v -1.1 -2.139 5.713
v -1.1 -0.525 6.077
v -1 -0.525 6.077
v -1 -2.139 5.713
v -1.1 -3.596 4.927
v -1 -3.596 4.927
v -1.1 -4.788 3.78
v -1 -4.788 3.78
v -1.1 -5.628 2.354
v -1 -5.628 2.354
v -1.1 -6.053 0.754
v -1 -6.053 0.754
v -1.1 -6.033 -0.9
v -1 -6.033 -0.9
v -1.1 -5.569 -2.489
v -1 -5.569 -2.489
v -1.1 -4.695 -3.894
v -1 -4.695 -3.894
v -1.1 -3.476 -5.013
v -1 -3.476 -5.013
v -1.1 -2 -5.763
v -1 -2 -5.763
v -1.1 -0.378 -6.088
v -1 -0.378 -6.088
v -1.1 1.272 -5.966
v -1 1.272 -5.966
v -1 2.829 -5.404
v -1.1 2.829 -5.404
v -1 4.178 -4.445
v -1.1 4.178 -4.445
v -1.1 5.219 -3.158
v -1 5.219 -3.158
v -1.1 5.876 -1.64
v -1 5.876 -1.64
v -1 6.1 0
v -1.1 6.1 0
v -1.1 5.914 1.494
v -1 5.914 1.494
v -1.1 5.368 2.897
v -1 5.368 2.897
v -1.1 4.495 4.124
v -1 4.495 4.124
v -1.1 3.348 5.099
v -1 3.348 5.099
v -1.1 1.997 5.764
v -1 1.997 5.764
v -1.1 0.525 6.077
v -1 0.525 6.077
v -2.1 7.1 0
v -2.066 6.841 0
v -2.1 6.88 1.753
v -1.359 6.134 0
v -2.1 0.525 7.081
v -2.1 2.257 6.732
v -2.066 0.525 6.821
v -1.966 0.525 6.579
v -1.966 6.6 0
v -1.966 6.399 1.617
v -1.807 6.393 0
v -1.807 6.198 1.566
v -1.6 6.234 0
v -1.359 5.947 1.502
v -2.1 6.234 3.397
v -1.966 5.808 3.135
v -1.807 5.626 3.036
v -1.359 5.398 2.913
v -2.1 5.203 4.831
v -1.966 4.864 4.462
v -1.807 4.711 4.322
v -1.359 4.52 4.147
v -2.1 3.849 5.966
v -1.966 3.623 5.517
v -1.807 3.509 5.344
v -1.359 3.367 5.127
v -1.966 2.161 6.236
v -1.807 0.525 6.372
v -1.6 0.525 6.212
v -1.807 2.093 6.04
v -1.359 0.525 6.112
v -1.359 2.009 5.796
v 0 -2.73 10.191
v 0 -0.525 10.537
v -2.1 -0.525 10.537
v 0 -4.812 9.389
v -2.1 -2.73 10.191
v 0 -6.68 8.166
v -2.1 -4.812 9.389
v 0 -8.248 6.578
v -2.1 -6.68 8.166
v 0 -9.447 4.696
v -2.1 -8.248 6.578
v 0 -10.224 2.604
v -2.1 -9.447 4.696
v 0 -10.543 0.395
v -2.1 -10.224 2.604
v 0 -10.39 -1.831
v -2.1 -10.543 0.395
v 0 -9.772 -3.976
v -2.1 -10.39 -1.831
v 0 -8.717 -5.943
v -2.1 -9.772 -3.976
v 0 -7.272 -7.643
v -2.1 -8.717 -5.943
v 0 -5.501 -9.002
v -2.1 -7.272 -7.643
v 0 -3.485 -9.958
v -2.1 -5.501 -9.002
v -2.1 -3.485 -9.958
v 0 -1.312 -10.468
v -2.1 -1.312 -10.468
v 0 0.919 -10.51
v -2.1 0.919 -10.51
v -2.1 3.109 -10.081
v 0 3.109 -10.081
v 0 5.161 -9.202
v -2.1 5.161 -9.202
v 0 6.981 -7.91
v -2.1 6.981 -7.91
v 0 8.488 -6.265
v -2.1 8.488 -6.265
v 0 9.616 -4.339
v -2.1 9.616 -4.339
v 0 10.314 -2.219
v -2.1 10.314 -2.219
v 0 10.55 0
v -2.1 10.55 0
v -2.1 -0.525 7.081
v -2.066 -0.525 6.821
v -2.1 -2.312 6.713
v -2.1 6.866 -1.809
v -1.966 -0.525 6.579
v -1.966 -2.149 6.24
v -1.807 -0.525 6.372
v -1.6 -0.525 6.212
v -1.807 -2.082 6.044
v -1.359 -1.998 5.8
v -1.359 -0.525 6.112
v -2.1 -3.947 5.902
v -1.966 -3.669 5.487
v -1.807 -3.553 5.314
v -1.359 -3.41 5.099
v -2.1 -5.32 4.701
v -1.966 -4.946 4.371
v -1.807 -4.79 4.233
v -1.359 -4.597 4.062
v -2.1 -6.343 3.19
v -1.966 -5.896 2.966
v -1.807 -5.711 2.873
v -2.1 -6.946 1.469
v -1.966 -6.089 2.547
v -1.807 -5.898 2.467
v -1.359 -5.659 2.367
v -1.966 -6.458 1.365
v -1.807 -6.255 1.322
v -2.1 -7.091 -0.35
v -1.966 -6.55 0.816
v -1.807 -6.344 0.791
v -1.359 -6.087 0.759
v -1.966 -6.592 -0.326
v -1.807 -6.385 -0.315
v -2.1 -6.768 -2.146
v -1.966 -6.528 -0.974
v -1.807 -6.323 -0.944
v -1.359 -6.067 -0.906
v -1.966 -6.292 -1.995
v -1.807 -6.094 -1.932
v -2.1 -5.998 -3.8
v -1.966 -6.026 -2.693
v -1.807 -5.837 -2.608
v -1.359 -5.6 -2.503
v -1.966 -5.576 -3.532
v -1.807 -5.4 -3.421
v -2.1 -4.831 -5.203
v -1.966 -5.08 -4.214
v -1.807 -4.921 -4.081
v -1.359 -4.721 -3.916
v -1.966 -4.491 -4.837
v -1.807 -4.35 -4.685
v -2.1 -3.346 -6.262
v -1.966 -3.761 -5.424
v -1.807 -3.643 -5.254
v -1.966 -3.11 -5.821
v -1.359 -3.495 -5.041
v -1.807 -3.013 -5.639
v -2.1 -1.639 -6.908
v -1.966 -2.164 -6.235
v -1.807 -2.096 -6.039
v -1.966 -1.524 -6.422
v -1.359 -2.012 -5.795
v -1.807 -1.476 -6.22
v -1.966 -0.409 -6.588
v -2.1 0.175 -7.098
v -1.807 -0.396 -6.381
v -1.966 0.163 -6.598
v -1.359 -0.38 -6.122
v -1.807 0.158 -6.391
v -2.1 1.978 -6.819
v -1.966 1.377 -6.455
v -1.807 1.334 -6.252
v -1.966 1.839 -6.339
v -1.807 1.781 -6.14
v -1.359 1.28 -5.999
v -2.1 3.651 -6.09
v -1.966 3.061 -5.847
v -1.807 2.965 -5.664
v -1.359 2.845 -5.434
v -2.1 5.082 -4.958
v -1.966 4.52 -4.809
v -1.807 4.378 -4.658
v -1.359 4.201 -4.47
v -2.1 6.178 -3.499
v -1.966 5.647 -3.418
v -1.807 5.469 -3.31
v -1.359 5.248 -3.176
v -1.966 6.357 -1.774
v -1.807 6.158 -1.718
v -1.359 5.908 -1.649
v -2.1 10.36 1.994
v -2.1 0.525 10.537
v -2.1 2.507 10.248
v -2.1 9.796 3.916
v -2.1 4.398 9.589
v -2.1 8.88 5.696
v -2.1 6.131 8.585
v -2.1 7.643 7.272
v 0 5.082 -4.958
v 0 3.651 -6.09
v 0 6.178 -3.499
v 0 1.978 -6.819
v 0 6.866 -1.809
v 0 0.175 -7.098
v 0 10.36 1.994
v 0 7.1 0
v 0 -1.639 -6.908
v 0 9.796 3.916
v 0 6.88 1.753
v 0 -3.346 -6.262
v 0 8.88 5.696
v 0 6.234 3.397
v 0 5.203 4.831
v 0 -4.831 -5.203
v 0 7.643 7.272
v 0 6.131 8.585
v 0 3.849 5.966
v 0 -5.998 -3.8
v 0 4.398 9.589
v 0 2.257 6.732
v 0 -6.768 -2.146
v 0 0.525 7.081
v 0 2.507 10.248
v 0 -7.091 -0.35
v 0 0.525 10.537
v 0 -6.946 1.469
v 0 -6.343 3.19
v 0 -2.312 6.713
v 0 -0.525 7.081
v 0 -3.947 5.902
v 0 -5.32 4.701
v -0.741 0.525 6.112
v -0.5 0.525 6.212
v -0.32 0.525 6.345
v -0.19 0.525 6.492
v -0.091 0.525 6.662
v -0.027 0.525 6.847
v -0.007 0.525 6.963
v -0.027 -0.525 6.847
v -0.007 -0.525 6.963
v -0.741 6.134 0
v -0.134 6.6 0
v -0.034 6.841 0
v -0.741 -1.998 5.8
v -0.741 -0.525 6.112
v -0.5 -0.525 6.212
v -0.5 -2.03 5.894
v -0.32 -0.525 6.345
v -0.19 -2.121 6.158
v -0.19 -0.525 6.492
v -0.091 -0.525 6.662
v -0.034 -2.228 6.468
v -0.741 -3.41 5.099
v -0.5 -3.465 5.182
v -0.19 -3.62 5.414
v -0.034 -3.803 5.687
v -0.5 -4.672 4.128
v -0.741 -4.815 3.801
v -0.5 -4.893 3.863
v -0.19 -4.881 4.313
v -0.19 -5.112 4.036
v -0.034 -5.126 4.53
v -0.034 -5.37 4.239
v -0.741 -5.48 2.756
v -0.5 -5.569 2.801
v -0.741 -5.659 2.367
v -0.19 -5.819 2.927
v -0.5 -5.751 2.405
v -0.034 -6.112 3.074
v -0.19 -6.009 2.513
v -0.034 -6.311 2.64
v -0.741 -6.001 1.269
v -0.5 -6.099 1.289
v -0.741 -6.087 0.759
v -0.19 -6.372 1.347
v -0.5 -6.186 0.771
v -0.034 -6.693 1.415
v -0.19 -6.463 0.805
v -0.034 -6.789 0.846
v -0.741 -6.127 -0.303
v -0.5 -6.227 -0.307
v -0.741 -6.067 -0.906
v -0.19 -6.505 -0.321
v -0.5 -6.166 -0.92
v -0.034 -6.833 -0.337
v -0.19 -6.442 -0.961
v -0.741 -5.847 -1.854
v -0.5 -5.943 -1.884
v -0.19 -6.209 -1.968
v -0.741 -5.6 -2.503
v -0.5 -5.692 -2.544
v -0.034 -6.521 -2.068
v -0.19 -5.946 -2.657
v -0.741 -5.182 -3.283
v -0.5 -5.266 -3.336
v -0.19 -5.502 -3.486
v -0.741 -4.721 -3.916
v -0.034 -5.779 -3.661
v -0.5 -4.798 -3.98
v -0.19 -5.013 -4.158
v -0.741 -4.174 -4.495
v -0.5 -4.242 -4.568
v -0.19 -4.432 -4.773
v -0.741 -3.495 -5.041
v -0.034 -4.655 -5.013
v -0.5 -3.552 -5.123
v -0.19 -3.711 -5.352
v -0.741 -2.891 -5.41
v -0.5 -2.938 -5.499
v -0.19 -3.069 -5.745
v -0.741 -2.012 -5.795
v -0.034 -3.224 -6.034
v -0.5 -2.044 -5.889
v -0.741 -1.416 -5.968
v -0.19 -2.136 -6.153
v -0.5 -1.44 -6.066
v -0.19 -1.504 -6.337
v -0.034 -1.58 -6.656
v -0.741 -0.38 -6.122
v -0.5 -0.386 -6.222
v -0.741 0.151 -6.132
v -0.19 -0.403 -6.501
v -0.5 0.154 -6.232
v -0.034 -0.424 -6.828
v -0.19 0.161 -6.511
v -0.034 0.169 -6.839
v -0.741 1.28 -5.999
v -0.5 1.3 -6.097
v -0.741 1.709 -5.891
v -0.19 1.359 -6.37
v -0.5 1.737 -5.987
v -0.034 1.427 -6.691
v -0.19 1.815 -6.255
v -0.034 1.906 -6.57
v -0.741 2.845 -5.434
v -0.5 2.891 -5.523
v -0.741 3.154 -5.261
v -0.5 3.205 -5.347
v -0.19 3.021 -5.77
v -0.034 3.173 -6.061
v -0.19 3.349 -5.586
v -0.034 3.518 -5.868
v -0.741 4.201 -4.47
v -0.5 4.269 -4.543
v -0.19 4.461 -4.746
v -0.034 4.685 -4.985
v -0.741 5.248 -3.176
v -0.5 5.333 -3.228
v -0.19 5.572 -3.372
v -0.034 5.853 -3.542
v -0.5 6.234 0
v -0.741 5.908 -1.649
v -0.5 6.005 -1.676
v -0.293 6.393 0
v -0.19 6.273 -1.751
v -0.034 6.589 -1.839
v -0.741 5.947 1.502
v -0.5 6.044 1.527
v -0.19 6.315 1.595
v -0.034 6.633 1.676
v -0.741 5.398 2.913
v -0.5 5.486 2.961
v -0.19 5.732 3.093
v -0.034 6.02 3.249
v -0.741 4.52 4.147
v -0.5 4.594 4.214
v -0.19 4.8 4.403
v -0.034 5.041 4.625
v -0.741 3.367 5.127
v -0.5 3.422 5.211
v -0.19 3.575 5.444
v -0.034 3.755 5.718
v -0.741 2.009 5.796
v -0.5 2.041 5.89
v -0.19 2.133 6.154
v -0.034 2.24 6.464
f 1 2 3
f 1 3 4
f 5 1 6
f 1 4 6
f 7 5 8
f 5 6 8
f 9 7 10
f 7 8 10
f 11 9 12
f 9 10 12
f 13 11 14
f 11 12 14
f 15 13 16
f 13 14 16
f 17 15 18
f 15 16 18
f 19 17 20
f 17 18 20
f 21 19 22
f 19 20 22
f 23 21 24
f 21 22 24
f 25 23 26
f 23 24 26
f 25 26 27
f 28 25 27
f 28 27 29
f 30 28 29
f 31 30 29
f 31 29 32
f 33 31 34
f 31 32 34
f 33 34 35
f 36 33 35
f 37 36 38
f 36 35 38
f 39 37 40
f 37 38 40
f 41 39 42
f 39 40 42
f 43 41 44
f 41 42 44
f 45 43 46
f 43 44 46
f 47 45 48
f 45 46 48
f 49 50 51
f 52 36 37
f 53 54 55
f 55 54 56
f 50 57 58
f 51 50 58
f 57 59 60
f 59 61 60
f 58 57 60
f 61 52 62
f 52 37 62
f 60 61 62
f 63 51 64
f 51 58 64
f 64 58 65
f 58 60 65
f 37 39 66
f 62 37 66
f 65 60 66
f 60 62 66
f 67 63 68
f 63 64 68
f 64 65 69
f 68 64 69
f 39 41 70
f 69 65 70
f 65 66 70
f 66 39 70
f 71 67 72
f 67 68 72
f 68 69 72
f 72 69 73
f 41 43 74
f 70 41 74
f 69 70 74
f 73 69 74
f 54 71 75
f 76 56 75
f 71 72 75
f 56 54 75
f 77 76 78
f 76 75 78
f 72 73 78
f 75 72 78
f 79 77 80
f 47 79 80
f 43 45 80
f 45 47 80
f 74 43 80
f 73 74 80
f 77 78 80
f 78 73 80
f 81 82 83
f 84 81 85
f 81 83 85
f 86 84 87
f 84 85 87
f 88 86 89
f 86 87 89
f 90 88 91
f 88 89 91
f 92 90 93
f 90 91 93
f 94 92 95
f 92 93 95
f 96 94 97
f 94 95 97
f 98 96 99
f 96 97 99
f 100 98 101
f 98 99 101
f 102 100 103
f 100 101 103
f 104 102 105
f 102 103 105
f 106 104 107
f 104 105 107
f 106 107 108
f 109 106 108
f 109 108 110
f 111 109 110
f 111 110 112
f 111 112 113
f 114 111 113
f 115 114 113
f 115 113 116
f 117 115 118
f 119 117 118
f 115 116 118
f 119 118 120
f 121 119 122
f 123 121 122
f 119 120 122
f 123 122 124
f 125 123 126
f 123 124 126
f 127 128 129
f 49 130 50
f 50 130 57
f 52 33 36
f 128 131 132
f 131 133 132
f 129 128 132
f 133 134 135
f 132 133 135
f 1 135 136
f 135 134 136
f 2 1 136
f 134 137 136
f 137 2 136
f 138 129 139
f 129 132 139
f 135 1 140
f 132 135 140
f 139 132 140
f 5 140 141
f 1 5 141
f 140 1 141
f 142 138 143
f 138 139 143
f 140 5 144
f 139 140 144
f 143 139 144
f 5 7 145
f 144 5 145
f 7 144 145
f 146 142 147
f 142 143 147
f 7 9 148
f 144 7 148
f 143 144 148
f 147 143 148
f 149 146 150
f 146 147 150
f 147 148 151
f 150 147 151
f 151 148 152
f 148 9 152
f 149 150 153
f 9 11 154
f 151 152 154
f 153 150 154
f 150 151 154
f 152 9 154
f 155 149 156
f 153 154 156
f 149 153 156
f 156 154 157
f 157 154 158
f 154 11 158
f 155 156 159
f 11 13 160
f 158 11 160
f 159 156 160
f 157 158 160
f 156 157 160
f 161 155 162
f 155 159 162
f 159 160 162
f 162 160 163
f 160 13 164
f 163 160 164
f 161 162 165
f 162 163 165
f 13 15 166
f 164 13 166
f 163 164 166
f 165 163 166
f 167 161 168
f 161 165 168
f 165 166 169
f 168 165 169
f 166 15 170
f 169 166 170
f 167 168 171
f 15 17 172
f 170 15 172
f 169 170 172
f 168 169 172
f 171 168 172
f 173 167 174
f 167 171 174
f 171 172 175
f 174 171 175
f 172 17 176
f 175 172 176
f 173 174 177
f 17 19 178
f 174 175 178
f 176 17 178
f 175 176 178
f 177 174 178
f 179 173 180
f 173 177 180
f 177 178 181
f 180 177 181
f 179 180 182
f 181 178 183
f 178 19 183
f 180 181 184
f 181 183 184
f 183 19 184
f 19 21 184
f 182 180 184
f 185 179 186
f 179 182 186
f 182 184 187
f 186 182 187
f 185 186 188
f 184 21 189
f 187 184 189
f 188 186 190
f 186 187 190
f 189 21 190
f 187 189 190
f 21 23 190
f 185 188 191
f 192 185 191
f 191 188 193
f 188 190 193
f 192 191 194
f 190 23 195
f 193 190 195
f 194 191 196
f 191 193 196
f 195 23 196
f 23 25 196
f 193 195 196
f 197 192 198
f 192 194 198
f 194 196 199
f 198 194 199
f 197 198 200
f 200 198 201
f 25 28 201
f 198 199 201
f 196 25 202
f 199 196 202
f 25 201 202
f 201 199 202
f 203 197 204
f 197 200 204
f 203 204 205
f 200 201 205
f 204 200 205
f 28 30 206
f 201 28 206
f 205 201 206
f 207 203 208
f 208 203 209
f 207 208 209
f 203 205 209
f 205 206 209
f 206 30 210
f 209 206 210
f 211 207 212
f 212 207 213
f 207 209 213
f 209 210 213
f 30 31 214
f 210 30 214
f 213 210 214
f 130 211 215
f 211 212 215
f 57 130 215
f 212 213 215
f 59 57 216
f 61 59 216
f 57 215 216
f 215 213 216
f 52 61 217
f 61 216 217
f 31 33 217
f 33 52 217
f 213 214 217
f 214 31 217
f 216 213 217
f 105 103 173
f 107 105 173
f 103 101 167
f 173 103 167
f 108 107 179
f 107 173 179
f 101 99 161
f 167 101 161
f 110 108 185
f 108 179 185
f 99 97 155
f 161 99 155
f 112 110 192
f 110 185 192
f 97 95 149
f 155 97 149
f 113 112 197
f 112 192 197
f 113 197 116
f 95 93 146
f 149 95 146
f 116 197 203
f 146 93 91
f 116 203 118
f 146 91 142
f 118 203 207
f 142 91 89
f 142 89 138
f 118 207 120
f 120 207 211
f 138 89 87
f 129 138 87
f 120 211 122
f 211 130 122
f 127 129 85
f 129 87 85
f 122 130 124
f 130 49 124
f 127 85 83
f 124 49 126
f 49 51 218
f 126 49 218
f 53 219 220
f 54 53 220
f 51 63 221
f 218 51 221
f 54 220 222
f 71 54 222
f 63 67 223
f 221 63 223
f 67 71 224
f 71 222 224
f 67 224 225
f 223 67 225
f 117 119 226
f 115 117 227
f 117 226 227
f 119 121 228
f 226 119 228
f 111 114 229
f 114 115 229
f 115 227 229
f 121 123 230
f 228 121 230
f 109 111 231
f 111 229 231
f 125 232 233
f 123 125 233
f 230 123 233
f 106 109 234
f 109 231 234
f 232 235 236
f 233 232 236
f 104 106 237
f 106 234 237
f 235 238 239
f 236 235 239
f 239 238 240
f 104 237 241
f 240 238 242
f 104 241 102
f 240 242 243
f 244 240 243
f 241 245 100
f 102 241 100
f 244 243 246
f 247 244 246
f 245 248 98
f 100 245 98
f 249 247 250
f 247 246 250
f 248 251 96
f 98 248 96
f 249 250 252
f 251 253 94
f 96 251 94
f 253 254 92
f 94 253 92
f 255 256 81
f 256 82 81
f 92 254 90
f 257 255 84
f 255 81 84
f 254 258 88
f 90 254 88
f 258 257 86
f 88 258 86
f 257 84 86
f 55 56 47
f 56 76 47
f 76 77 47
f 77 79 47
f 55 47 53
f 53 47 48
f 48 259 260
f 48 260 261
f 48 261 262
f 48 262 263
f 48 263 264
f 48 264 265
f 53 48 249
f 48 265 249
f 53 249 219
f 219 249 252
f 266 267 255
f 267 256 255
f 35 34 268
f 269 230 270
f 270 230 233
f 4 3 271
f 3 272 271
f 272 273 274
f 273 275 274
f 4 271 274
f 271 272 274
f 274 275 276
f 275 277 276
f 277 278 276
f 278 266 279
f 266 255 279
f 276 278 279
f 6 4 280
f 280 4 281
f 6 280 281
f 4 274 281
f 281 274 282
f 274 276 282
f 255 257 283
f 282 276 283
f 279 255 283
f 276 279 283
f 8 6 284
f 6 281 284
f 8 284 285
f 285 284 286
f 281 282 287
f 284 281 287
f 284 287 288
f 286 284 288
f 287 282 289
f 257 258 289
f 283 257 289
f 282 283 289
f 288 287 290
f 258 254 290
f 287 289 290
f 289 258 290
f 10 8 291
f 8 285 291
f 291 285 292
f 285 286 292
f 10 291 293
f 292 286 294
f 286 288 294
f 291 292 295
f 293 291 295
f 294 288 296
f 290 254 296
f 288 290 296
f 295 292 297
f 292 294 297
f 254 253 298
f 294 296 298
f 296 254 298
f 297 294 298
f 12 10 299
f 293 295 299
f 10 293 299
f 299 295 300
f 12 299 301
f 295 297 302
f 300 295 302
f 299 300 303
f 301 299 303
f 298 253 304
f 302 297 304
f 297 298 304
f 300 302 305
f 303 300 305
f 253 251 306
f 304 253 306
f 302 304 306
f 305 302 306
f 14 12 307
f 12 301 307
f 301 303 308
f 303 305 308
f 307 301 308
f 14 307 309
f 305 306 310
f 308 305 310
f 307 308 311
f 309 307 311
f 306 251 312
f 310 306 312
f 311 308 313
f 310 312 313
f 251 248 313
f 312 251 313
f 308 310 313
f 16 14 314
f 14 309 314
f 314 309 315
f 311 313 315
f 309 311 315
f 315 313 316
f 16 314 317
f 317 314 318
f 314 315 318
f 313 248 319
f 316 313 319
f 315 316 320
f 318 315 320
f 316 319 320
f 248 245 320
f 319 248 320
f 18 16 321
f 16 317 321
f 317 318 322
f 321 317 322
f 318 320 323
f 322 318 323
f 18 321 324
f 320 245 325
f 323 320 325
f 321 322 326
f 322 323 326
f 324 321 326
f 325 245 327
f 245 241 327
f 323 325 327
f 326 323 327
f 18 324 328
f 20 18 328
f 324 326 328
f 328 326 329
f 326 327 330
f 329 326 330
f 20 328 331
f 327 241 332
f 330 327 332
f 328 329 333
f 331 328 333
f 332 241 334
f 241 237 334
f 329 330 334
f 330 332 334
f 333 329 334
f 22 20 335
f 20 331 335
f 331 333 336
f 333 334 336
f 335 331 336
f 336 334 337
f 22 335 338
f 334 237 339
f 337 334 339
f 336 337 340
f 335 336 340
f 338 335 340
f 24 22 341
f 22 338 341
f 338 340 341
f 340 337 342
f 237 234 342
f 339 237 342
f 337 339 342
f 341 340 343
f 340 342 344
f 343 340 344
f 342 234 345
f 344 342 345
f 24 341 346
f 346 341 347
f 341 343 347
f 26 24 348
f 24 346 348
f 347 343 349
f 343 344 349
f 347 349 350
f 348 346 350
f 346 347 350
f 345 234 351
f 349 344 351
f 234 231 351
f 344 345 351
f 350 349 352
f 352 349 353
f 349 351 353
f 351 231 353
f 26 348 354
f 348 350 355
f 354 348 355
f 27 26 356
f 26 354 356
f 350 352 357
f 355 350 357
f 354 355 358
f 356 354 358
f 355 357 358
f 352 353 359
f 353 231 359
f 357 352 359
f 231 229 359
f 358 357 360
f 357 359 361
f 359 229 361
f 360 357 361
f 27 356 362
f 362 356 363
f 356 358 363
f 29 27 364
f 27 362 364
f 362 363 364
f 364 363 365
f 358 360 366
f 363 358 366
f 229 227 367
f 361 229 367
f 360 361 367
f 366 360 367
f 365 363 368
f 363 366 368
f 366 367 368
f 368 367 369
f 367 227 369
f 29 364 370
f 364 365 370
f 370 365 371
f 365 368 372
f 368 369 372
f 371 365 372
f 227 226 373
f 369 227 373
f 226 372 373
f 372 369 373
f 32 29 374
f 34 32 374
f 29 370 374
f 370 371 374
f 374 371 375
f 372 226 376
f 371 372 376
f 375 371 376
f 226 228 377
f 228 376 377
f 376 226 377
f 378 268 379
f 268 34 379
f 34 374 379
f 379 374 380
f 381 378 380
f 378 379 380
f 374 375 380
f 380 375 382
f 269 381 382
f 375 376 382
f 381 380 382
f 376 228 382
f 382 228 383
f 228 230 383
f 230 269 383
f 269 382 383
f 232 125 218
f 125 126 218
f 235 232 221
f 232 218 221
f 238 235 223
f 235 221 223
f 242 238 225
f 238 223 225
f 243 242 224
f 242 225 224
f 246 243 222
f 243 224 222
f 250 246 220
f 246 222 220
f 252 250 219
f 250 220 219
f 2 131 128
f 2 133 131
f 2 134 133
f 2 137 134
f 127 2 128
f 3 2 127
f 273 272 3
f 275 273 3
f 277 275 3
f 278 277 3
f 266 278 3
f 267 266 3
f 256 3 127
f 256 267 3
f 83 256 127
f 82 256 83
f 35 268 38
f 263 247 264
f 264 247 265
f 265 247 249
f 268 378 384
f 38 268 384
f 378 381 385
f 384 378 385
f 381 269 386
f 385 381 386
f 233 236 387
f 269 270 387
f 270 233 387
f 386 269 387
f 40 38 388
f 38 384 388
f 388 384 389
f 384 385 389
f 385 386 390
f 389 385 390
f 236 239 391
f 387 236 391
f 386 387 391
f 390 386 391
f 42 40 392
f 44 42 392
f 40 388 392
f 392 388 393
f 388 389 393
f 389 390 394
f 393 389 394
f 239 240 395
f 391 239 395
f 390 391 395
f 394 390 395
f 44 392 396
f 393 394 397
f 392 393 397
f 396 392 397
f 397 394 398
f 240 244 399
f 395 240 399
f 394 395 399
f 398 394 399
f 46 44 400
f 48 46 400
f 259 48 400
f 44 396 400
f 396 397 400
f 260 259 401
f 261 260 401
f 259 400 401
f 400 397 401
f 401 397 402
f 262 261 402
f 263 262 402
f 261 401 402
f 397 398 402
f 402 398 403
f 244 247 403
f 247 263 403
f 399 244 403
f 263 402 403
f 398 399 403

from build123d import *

# Parameters (mm, degrees)
SKETCH2_W = 1.05
SKETCH2_H = 10.761
GAP_DEPTH = 3.1


with BuildPart() as part:
    # Sketch1 → Base-Revolve (revolve)
    with BuildSketch(Plane.XY):
        with BuildLine():
            Line((0, 7.1), (0, 10.55))
            Line((0, 10.55), (-2.1, 10.55))
            Line((-2.1, 10.55), (-2.1, 7.1))
            ThreePointArc((-2.1, 7.1), (-1.807106781, 6.392893219), (-1.1, 6.1))
            Line((-1.1, 6.1), (-1, 6.1))
            ThreePointArc((-1, 6.1), (-0.292893219, 6.392893219), (0, 7.1))
        make_face()
    revolve(axis=Axis((-34.925, 0, 0), (1, 0, 0)))

    # Sketch2 → Gap (cut, through all)
    with BuildSketch(Plane(origin=(0, 0, 0), x_dir=(0, -1, 0), z_dir=(-1, 0, 0))):
        with Locations((0, 5.3805)):
            Rectangle(SKETCH2_W, SKETCH2_H)
    extrude(amount=GAP_DEPTH, mode=Mode.SUBTRACT)


solid = part.part
